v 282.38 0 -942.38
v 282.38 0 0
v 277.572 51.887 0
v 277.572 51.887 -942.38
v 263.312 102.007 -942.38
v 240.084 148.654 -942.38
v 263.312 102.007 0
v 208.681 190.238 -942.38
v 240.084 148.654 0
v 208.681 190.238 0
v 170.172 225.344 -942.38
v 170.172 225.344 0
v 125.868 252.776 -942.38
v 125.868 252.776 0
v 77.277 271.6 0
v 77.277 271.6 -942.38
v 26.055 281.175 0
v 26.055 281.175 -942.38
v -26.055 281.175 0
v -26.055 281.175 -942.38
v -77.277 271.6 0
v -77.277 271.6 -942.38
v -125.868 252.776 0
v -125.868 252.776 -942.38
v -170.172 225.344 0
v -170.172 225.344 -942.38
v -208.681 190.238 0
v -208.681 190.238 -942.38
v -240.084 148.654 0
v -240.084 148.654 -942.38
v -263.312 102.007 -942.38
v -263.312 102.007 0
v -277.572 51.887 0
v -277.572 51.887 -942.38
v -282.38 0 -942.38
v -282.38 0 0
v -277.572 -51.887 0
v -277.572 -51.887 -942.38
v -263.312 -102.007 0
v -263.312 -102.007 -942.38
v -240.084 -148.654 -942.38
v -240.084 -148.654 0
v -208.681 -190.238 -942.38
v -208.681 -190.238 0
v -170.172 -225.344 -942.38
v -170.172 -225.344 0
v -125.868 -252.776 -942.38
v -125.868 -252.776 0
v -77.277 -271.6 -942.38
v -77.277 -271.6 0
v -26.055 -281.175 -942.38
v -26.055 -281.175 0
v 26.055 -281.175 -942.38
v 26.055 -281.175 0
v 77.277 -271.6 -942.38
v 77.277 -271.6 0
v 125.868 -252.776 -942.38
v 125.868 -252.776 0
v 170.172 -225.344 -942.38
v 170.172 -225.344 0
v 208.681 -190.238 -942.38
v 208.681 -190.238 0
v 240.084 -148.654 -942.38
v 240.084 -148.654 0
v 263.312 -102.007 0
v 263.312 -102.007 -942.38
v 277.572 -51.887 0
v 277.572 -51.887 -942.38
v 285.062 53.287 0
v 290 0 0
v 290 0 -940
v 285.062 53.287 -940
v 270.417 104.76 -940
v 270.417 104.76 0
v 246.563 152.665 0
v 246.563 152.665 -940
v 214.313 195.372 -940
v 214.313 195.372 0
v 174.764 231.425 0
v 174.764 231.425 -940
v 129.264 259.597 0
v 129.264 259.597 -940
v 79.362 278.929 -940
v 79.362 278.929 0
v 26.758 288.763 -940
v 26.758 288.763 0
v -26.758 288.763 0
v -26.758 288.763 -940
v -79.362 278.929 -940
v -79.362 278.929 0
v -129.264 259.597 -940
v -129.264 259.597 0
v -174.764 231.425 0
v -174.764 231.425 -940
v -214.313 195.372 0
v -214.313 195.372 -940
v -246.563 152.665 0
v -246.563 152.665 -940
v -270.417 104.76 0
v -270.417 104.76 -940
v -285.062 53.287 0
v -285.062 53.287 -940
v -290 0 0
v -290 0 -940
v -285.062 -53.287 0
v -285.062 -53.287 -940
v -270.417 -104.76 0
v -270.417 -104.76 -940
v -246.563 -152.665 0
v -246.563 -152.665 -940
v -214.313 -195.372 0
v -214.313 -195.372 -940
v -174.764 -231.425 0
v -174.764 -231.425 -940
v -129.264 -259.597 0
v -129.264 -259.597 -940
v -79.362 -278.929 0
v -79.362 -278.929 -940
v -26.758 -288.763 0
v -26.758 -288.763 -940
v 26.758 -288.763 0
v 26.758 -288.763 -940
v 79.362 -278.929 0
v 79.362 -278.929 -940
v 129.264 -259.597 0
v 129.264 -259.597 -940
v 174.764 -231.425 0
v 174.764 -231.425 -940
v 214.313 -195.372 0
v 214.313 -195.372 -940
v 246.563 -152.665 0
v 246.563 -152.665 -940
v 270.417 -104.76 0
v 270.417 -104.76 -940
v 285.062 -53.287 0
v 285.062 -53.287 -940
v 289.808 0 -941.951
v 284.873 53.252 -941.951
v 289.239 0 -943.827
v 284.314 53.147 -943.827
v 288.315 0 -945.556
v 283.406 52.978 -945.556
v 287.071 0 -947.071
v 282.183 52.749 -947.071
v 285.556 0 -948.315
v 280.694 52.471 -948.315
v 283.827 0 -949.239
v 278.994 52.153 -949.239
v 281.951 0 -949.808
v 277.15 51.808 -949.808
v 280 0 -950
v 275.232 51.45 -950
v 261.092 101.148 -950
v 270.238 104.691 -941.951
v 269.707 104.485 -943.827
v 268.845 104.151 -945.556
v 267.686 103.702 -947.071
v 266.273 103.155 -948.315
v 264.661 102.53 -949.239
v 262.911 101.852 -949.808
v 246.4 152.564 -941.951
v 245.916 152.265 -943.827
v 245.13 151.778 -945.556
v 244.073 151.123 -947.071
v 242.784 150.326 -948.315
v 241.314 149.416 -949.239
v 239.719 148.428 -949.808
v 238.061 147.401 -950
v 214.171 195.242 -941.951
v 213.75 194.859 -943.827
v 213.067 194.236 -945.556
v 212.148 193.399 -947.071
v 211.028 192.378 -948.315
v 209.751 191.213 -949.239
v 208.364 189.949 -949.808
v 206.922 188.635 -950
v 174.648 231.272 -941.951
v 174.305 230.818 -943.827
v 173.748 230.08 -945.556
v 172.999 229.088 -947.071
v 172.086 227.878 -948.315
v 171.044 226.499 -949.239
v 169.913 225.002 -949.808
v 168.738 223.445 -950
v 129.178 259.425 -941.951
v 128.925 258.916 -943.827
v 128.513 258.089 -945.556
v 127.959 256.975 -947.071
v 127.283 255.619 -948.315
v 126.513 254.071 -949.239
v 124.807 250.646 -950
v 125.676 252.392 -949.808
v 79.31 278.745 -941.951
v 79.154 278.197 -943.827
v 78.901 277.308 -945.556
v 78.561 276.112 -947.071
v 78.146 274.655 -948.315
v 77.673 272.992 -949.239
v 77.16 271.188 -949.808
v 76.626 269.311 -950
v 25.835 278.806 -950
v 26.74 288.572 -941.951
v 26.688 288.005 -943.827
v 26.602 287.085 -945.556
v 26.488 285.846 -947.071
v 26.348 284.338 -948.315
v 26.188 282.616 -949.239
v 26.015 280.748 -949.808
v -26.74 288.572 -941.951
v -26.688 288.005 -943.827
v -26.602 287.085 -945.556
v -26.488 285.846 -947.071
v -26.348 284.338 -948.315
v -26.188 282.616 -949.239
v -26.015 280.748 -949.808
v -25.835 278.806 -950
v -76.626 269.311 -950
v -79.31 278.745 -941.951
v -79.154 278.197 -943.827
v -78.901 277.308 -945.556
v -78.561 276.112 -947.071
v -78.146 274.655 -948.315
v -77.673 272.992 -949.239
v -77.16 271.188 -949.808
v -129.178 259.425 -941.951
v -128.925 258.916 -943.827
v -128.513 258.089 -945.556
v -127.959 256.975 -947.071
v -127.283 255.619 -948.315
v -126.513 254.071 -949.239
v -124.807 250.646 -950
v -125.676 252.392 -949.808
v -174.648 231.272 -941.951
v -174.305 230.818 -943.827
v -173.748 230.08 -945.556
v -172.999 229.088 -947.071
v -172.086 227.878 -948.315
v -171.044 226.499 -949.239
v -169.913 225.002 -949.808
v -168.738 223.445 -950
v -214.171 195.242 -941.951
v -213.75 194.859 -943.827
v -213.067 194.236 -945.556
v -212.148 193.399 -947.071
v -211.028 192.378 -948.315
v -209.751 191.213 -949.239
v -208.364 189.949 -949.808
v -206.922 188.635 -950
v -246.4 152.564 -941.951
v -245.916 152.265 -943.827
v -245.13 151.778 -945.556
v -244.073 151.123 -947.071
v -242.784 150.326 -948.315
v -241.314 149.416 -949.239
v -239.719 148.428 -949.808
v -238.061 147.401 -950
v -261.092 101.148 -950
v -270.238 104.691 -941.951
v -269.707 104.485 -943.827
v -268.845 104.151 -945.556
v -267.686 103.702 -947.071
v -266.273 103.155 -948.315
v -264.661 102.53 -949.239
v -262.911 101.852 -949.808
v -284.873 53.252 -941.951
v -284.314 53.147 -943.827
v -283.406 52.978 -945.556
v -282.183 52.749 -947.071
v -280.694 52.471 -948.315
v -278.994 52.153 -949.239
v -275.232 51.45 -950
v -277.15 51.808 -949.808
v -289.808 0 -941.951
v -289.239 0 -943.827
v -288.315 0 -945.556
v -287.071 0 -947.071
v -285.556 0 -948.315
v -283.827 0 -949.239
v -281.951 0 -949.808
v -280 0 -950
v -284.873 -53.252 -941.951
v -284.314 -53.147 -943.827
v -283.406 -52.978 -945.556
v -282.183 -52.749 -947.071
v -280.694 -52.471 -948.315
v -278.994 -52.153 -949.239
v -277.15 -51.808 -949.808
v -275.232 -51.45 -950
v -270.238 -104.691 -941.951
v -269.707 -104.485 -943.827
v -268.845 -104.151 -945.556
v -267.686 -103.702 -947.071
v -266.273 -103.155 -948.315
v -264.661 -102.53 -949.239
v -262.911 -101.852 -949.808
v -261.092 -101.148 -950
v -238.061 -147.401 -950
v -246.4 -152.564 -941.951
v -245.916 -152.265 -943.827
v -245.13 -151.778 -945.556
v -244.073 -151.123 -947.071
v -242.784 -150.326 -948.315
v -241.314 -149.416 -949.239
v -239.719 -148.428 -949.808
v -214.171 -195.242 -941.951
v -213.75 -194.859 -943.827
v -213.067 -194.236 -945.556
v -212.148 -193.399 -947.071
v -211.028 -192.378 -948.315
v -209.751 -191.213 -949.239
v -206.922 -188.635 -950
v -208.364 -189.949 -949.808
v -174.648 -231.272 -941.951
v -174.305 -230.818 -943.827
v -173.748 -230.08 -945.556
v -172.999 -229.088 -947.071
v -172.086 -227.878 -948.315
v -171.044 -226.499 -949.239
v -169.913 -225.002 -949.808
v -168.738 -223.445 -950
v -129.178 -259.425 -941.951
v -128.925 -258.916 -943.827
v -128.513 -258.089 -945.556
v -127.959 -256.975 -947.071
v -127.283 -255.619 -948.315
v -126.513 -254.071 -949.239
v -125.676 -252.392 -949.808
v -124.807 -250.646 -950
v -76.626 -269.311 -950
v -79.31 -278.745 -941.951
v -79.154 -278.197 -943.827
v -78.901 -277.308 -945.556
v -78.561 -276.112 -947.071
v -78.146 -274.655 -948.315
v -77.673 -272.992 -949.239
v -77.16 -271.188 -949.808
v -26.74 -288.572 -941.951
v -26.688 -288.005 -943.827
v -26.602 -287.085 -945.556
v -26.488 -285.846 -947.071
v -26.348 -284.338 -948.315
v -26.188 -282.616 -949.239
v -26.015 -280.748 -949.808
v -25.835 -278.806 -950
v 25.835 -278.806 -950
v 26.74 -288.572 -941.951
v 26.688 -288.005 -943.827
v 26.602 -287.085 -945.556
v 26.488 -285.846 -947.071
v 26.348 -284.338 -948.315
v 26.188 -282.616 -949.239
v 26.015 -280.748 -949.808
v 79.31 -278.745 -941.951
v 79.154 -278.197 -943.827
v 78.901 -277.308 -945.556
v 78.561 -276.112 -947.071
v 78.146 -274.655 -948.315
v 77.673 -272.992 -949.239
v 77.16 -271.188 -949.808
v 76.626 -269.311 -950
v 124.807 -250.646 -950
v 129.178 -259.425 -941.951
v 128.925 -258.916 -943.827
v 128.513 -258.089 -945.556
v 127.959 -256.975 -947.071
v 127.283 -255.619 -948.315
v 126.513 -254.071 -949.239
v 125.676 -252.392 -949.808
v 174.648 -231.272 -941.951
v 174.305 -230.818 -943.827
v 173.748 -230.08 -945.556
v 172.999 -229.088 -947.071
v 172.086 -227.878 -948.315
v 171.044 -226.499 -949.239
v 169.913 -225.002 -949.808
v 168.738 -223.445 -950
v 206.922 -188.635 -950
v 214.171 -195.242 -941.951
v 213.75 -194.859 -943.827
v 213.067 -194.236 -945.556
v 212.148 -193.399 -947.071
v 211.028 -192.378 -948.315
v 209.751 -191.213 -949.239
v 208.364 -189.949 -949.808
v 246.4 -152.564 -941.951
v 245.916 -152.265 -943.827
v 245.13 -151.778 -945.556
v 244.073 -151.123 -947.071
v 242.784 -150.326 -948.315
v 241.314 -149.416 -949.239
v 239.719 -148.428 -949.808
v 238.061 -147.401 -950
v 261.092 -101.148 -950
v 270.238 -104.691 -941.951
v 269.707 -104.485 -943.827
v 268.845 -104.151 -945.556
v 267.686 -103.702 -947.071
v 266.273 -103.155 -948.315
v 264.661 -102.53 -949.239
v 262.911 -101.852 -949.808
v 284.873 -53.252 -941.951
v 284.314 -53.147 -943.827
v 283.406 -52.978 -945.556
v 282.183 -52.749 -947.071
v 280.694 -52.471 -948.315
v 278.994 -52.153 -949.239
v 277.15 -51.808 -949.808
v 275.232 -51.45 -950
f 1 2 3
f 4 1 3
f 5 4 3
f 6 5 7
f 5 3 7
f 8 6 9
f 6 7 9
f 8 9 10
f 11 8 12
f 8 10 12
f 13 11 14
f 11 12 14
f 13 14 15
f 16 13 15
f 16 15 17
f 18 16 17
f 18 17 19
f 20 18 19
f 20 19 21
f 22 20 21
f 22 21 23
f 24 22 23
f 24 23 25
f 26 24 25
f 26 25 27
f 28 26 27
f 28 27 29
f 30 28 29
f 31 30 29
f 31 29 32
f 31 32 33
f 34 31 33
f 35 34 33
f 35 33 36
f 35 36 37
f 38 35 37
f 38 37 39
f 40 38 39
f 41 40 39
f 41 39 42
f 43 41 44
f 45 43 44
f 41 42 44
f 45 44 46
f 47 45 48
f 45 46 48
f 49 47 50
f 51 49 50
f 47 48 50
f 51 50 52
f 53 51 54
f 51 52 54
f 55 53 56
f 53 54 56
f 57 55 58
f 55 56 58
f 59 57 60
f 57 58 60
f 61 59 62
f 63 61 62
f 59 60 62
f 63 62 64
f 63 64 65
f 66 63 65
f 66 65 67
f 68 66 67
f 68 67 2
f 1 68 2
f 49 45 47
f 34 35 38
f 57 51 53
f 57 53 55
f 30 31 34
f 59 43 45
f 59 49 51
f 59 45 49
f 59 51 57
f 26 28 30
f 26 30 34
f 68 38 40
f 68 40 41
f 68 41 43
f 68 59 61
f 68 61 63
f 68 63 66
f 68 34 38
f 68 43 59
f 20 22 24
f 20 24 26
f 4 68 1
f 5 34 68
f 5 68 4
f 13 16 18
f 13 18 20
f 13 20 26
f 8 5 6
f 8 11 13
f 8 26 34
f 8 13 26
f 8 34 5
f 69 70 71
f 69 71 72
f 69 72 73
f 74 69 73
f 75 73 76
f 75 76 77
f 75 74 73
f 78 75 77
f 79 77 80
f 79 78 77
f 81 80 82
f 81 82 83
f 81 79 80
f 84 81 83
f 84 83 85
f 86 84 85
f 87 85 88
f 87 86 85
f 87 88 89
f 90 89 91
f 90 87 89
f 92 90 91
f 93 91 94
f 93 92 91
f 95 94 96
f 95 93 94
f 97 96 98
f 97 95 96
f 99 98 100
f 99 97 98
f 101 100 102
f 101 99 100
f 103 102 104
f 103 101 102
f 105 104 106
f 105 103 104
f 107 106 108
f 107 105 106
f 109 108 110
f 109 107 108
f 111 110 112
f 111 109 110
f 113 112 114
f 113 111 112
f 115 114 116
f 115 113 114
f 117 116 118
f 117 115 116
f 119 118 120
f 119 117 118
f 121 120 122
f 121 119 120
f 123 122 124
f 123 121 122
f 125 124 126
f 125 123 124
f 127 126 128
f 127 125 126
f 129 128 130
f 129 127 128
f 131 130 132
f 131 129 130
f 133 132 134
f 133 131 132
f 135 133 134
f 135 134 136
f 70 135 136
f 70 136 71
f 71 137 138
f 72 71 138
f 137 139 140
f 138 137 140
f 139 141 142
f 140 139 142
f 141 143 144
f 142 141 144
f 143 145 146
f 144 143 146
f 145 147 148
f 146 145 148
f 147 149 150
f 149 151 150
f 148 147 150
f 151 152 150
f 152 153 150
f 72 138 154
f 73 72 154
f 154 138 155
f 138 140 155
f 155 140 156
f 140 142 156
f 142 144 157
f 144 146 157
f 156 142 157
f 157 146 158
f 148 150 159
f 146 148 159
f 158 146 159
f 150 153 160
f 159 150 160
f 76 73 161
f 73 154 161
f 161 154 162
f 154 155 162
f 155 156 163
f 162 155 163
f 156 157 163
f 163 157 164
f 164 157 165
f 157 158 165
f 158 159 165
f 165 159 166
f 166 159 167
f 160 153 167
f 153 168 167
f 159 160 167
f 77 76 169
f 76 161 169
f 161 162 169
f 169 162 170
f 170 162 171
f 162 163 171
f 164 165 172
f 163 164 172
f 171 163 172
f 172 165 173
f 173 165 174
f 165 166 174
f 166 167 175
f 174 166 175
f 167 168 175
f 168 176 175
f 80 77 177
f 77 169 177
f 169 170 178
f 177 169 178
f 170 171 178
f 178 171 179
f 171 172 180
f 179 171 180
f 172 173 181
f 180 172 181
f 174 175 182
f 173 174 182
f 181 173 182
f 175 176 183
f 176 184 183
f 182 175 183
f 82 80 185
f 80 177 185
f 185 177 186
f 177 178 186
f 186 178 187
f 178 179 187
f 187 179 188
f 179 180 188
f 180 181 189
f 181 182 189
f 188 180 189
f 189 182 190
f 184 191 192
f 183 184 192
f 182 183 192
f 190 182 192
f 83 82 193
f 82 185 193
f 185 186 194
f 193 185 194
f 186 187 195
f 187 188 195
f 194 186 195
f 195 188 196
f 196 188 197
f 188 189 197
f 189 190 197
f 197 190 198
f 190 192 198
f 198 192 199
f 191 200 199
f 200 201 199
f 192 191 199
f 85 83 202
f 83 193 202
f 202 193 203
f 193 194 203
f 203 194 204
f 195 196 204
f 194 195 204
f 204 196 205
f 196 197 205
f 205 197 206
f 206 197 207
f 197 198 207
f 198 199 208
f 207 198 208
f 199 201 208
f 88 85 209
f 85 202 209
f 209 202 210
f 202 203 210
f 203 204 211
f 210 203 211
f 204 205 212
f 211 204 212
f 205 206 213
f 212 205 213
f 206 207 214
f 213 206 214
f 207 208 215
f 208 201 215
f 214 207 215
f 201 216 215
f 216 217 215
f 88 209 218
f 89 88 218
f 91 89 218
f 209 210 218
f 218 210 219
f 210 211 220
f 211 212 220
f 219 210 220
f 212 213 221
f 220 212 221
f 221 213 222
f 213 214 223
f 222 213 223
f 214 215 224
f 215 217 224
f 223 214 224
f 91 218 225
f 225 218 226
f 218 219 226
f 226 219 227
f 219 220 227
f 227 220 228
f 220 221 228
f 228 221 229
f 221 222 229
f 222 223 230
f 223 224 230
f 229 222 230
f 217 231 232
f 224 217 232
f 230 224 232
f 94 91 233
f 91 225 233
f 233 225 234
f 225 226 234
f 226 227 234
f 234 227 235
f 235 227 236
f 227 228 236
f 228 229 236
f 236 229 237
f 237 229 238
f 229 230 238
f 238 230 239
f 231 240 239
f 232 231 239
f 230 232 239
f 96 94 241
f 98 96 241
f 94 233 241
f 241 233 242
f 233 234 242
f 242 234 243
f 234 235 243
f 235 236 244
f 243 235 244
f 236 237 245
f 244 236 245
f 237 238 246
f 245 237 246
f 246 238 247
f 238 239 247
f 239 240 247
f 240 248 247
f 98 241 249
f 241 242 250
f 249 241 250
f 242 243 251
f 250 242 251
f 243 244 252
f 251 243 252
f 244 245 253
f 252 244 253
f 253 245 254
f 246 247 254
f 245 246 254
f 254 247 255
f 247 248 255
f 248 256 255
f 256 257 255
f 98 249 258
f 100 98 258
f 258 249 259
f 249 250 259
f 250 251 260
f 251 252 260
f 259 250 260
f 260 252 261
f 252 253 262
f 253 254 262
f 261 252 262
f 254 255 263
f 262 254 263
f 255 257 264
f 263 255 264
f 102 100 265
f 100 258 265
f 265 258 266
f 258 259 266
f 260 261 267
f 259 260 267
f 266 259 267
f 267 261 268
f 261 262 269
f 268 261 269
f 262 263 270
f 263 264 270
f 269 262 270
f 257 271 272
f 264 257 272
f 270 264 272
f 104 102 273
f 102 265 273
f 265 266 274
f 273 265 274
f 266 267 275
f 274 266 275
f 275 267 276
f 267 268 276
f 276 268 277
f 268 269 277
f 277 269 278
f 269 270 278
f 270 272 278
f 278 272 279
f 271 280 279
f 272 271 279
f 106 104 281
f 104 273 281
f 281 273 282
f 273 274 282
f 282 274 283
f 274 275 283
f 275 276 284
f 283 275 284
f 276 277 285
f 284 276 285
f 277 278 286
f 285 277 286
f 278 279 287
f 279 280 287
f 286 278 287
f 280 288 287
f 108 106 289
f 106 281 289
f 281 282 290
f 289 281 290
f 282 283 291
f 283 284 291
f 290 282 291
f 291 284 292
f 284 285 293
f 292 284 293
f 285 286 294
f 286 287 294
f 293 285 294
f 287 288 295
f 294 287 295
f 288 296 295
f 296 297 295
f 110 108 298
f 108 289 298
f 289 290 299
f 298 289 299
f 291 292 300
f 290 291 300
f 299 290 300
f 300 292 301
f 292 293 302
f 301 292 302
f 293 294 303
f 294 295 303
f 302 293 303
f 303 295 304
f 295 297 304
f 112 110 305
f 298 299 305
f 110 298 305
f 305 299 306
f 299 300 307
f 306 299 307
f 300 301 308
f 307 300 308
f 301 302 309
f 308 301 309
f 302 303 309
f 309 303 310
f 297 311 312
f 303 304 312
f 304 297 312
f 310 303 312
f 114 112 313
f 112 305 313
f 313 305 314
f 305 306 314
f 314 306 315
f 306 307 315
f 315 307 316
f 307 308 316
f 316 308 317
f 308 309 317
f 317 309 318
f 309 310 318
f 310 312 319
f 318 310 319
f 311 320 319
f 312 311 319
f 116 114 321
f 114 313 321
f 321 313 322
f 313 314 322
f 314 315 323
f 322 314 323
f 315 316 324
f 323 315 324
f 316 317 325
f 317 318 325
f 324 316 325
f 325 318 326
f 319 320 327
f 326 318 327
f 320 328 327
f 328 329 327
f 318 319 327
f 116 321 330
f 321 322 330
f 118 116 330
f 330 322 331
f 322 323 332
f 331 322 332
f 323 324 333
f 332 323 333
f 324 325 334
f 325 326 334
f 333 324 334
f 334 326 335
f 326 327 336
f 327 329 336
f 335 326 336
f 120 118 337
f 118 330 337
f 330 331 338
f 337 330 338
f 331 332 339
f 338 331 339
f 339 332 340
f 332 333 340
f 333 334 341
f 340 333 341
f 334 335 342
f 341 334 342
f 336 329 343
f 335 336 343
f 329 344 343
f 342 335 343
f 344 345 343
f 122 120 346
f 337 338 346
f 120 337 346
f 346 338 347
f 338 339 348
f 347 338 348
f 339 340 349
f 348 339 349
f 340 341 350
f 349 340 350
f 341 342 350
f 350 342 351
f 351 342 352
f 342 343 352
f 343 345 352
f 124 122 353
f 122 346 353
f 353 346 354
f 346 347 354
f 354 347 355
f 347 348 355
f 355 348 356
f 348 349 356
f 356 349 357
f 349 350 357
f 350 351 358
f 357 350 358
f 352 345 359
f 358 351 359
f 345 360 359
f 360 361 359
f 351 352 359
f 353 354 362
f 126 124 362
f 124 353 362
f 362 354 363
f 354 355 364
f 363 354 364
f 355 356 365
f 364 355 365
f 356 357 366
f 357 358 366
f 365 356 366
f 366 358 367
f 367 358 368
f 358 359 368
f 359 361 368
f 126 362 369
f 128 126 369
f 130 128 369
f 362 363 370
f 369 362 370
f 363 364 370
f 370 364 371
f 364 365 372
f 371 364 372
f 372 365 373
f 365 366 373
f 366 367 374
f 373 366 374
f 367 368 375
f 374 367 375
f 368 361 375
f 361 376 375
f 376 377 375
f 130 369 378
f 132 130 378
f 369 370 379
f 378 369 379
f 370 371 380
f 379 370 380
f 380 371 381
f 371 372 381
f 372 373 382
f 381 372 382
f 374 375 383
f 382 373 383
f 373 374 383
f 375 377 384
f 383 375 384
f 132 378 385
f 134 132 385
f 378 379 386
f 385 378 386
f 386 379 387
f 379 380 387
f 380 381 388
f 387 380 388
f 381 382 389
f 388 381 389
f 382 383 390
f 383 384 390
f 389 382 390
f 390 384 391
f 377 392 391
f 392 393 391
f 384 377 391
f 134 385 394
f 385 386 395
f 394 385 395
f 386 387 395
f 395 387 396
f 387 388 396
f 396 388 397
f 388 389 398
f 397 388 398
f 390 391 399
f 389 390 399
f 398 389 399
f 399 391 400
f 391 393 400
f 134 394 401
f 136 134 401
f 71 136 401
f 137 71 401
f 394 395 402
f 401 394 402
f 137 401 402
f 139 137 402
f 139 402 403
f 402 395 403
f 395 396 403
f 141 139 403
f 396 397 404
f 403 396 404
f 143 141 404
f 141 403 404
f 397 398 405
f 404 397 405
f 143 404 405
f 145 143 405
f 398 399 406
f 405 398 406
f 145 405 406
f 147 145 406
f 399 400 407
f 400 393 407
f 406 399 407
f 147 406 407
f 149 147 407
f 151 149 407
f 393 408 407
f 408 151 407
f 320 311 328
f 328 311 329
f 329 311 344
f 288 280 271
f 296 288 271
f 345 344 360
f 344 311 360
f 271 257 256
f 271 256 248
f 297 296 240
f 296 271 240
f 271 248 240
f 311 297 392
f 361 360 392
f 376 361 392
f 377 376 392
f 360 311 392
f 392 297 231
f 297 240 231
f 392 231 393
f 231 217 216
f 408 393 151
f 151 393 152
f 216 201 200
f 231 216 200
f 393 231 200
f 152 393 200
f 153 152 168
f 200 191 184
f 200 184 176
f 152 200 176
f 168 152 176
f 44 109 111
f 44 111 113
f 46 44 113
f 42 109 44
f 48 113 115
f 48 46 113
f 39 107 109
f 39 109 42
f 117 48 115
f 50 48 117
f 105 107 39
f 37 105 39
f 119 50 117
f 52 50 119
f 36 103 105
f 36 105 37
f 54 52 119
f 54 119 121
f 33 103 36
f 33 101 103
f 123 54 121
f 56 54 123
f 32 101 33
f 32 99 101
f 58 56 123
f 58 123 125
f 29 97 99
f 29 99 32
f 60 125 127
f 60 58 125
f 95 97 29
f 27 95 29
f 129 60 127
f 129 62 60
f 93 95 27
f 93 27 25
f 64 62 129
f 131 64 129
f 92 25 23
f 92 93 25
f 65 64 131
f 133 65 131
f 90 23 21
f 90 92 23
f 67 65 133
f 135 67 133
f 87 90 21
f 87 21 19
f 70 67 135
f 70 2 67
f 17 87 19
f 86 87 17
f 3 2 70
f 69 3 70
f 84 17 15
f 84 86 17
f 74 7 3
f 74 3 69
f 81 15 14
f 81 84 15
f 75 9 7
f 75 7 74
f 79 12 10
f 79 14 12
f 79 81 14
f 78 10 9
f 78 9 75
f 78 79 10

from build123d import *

# Parameters (mm, degrees)
F0_R     = 290
F1_DEPTH = 950
F2_T     = -7.62
F3_R     = 10


with BuildPart() as f1:
    # F0 (on Top) → F1 (new body)
    with BuildSketch(Plane.XY):
        Circle(F0_R)
    extrude(amount=-F1_DEPTH)

    # F2
    f2_openings = [f1.faces().sort_by_distance(p)[0] for p in [
        (0, 0, 0),
    ]]
    offset(amount=F2_T, openings=f2_openings)

    # F3
    f3_edges = [f1.edges().sort_by_distance(p)[0] for p in [
        (-290, 0, -950),
    ]]
    fillet(f3_edges, radius=F3_R)


solid = f1.part
